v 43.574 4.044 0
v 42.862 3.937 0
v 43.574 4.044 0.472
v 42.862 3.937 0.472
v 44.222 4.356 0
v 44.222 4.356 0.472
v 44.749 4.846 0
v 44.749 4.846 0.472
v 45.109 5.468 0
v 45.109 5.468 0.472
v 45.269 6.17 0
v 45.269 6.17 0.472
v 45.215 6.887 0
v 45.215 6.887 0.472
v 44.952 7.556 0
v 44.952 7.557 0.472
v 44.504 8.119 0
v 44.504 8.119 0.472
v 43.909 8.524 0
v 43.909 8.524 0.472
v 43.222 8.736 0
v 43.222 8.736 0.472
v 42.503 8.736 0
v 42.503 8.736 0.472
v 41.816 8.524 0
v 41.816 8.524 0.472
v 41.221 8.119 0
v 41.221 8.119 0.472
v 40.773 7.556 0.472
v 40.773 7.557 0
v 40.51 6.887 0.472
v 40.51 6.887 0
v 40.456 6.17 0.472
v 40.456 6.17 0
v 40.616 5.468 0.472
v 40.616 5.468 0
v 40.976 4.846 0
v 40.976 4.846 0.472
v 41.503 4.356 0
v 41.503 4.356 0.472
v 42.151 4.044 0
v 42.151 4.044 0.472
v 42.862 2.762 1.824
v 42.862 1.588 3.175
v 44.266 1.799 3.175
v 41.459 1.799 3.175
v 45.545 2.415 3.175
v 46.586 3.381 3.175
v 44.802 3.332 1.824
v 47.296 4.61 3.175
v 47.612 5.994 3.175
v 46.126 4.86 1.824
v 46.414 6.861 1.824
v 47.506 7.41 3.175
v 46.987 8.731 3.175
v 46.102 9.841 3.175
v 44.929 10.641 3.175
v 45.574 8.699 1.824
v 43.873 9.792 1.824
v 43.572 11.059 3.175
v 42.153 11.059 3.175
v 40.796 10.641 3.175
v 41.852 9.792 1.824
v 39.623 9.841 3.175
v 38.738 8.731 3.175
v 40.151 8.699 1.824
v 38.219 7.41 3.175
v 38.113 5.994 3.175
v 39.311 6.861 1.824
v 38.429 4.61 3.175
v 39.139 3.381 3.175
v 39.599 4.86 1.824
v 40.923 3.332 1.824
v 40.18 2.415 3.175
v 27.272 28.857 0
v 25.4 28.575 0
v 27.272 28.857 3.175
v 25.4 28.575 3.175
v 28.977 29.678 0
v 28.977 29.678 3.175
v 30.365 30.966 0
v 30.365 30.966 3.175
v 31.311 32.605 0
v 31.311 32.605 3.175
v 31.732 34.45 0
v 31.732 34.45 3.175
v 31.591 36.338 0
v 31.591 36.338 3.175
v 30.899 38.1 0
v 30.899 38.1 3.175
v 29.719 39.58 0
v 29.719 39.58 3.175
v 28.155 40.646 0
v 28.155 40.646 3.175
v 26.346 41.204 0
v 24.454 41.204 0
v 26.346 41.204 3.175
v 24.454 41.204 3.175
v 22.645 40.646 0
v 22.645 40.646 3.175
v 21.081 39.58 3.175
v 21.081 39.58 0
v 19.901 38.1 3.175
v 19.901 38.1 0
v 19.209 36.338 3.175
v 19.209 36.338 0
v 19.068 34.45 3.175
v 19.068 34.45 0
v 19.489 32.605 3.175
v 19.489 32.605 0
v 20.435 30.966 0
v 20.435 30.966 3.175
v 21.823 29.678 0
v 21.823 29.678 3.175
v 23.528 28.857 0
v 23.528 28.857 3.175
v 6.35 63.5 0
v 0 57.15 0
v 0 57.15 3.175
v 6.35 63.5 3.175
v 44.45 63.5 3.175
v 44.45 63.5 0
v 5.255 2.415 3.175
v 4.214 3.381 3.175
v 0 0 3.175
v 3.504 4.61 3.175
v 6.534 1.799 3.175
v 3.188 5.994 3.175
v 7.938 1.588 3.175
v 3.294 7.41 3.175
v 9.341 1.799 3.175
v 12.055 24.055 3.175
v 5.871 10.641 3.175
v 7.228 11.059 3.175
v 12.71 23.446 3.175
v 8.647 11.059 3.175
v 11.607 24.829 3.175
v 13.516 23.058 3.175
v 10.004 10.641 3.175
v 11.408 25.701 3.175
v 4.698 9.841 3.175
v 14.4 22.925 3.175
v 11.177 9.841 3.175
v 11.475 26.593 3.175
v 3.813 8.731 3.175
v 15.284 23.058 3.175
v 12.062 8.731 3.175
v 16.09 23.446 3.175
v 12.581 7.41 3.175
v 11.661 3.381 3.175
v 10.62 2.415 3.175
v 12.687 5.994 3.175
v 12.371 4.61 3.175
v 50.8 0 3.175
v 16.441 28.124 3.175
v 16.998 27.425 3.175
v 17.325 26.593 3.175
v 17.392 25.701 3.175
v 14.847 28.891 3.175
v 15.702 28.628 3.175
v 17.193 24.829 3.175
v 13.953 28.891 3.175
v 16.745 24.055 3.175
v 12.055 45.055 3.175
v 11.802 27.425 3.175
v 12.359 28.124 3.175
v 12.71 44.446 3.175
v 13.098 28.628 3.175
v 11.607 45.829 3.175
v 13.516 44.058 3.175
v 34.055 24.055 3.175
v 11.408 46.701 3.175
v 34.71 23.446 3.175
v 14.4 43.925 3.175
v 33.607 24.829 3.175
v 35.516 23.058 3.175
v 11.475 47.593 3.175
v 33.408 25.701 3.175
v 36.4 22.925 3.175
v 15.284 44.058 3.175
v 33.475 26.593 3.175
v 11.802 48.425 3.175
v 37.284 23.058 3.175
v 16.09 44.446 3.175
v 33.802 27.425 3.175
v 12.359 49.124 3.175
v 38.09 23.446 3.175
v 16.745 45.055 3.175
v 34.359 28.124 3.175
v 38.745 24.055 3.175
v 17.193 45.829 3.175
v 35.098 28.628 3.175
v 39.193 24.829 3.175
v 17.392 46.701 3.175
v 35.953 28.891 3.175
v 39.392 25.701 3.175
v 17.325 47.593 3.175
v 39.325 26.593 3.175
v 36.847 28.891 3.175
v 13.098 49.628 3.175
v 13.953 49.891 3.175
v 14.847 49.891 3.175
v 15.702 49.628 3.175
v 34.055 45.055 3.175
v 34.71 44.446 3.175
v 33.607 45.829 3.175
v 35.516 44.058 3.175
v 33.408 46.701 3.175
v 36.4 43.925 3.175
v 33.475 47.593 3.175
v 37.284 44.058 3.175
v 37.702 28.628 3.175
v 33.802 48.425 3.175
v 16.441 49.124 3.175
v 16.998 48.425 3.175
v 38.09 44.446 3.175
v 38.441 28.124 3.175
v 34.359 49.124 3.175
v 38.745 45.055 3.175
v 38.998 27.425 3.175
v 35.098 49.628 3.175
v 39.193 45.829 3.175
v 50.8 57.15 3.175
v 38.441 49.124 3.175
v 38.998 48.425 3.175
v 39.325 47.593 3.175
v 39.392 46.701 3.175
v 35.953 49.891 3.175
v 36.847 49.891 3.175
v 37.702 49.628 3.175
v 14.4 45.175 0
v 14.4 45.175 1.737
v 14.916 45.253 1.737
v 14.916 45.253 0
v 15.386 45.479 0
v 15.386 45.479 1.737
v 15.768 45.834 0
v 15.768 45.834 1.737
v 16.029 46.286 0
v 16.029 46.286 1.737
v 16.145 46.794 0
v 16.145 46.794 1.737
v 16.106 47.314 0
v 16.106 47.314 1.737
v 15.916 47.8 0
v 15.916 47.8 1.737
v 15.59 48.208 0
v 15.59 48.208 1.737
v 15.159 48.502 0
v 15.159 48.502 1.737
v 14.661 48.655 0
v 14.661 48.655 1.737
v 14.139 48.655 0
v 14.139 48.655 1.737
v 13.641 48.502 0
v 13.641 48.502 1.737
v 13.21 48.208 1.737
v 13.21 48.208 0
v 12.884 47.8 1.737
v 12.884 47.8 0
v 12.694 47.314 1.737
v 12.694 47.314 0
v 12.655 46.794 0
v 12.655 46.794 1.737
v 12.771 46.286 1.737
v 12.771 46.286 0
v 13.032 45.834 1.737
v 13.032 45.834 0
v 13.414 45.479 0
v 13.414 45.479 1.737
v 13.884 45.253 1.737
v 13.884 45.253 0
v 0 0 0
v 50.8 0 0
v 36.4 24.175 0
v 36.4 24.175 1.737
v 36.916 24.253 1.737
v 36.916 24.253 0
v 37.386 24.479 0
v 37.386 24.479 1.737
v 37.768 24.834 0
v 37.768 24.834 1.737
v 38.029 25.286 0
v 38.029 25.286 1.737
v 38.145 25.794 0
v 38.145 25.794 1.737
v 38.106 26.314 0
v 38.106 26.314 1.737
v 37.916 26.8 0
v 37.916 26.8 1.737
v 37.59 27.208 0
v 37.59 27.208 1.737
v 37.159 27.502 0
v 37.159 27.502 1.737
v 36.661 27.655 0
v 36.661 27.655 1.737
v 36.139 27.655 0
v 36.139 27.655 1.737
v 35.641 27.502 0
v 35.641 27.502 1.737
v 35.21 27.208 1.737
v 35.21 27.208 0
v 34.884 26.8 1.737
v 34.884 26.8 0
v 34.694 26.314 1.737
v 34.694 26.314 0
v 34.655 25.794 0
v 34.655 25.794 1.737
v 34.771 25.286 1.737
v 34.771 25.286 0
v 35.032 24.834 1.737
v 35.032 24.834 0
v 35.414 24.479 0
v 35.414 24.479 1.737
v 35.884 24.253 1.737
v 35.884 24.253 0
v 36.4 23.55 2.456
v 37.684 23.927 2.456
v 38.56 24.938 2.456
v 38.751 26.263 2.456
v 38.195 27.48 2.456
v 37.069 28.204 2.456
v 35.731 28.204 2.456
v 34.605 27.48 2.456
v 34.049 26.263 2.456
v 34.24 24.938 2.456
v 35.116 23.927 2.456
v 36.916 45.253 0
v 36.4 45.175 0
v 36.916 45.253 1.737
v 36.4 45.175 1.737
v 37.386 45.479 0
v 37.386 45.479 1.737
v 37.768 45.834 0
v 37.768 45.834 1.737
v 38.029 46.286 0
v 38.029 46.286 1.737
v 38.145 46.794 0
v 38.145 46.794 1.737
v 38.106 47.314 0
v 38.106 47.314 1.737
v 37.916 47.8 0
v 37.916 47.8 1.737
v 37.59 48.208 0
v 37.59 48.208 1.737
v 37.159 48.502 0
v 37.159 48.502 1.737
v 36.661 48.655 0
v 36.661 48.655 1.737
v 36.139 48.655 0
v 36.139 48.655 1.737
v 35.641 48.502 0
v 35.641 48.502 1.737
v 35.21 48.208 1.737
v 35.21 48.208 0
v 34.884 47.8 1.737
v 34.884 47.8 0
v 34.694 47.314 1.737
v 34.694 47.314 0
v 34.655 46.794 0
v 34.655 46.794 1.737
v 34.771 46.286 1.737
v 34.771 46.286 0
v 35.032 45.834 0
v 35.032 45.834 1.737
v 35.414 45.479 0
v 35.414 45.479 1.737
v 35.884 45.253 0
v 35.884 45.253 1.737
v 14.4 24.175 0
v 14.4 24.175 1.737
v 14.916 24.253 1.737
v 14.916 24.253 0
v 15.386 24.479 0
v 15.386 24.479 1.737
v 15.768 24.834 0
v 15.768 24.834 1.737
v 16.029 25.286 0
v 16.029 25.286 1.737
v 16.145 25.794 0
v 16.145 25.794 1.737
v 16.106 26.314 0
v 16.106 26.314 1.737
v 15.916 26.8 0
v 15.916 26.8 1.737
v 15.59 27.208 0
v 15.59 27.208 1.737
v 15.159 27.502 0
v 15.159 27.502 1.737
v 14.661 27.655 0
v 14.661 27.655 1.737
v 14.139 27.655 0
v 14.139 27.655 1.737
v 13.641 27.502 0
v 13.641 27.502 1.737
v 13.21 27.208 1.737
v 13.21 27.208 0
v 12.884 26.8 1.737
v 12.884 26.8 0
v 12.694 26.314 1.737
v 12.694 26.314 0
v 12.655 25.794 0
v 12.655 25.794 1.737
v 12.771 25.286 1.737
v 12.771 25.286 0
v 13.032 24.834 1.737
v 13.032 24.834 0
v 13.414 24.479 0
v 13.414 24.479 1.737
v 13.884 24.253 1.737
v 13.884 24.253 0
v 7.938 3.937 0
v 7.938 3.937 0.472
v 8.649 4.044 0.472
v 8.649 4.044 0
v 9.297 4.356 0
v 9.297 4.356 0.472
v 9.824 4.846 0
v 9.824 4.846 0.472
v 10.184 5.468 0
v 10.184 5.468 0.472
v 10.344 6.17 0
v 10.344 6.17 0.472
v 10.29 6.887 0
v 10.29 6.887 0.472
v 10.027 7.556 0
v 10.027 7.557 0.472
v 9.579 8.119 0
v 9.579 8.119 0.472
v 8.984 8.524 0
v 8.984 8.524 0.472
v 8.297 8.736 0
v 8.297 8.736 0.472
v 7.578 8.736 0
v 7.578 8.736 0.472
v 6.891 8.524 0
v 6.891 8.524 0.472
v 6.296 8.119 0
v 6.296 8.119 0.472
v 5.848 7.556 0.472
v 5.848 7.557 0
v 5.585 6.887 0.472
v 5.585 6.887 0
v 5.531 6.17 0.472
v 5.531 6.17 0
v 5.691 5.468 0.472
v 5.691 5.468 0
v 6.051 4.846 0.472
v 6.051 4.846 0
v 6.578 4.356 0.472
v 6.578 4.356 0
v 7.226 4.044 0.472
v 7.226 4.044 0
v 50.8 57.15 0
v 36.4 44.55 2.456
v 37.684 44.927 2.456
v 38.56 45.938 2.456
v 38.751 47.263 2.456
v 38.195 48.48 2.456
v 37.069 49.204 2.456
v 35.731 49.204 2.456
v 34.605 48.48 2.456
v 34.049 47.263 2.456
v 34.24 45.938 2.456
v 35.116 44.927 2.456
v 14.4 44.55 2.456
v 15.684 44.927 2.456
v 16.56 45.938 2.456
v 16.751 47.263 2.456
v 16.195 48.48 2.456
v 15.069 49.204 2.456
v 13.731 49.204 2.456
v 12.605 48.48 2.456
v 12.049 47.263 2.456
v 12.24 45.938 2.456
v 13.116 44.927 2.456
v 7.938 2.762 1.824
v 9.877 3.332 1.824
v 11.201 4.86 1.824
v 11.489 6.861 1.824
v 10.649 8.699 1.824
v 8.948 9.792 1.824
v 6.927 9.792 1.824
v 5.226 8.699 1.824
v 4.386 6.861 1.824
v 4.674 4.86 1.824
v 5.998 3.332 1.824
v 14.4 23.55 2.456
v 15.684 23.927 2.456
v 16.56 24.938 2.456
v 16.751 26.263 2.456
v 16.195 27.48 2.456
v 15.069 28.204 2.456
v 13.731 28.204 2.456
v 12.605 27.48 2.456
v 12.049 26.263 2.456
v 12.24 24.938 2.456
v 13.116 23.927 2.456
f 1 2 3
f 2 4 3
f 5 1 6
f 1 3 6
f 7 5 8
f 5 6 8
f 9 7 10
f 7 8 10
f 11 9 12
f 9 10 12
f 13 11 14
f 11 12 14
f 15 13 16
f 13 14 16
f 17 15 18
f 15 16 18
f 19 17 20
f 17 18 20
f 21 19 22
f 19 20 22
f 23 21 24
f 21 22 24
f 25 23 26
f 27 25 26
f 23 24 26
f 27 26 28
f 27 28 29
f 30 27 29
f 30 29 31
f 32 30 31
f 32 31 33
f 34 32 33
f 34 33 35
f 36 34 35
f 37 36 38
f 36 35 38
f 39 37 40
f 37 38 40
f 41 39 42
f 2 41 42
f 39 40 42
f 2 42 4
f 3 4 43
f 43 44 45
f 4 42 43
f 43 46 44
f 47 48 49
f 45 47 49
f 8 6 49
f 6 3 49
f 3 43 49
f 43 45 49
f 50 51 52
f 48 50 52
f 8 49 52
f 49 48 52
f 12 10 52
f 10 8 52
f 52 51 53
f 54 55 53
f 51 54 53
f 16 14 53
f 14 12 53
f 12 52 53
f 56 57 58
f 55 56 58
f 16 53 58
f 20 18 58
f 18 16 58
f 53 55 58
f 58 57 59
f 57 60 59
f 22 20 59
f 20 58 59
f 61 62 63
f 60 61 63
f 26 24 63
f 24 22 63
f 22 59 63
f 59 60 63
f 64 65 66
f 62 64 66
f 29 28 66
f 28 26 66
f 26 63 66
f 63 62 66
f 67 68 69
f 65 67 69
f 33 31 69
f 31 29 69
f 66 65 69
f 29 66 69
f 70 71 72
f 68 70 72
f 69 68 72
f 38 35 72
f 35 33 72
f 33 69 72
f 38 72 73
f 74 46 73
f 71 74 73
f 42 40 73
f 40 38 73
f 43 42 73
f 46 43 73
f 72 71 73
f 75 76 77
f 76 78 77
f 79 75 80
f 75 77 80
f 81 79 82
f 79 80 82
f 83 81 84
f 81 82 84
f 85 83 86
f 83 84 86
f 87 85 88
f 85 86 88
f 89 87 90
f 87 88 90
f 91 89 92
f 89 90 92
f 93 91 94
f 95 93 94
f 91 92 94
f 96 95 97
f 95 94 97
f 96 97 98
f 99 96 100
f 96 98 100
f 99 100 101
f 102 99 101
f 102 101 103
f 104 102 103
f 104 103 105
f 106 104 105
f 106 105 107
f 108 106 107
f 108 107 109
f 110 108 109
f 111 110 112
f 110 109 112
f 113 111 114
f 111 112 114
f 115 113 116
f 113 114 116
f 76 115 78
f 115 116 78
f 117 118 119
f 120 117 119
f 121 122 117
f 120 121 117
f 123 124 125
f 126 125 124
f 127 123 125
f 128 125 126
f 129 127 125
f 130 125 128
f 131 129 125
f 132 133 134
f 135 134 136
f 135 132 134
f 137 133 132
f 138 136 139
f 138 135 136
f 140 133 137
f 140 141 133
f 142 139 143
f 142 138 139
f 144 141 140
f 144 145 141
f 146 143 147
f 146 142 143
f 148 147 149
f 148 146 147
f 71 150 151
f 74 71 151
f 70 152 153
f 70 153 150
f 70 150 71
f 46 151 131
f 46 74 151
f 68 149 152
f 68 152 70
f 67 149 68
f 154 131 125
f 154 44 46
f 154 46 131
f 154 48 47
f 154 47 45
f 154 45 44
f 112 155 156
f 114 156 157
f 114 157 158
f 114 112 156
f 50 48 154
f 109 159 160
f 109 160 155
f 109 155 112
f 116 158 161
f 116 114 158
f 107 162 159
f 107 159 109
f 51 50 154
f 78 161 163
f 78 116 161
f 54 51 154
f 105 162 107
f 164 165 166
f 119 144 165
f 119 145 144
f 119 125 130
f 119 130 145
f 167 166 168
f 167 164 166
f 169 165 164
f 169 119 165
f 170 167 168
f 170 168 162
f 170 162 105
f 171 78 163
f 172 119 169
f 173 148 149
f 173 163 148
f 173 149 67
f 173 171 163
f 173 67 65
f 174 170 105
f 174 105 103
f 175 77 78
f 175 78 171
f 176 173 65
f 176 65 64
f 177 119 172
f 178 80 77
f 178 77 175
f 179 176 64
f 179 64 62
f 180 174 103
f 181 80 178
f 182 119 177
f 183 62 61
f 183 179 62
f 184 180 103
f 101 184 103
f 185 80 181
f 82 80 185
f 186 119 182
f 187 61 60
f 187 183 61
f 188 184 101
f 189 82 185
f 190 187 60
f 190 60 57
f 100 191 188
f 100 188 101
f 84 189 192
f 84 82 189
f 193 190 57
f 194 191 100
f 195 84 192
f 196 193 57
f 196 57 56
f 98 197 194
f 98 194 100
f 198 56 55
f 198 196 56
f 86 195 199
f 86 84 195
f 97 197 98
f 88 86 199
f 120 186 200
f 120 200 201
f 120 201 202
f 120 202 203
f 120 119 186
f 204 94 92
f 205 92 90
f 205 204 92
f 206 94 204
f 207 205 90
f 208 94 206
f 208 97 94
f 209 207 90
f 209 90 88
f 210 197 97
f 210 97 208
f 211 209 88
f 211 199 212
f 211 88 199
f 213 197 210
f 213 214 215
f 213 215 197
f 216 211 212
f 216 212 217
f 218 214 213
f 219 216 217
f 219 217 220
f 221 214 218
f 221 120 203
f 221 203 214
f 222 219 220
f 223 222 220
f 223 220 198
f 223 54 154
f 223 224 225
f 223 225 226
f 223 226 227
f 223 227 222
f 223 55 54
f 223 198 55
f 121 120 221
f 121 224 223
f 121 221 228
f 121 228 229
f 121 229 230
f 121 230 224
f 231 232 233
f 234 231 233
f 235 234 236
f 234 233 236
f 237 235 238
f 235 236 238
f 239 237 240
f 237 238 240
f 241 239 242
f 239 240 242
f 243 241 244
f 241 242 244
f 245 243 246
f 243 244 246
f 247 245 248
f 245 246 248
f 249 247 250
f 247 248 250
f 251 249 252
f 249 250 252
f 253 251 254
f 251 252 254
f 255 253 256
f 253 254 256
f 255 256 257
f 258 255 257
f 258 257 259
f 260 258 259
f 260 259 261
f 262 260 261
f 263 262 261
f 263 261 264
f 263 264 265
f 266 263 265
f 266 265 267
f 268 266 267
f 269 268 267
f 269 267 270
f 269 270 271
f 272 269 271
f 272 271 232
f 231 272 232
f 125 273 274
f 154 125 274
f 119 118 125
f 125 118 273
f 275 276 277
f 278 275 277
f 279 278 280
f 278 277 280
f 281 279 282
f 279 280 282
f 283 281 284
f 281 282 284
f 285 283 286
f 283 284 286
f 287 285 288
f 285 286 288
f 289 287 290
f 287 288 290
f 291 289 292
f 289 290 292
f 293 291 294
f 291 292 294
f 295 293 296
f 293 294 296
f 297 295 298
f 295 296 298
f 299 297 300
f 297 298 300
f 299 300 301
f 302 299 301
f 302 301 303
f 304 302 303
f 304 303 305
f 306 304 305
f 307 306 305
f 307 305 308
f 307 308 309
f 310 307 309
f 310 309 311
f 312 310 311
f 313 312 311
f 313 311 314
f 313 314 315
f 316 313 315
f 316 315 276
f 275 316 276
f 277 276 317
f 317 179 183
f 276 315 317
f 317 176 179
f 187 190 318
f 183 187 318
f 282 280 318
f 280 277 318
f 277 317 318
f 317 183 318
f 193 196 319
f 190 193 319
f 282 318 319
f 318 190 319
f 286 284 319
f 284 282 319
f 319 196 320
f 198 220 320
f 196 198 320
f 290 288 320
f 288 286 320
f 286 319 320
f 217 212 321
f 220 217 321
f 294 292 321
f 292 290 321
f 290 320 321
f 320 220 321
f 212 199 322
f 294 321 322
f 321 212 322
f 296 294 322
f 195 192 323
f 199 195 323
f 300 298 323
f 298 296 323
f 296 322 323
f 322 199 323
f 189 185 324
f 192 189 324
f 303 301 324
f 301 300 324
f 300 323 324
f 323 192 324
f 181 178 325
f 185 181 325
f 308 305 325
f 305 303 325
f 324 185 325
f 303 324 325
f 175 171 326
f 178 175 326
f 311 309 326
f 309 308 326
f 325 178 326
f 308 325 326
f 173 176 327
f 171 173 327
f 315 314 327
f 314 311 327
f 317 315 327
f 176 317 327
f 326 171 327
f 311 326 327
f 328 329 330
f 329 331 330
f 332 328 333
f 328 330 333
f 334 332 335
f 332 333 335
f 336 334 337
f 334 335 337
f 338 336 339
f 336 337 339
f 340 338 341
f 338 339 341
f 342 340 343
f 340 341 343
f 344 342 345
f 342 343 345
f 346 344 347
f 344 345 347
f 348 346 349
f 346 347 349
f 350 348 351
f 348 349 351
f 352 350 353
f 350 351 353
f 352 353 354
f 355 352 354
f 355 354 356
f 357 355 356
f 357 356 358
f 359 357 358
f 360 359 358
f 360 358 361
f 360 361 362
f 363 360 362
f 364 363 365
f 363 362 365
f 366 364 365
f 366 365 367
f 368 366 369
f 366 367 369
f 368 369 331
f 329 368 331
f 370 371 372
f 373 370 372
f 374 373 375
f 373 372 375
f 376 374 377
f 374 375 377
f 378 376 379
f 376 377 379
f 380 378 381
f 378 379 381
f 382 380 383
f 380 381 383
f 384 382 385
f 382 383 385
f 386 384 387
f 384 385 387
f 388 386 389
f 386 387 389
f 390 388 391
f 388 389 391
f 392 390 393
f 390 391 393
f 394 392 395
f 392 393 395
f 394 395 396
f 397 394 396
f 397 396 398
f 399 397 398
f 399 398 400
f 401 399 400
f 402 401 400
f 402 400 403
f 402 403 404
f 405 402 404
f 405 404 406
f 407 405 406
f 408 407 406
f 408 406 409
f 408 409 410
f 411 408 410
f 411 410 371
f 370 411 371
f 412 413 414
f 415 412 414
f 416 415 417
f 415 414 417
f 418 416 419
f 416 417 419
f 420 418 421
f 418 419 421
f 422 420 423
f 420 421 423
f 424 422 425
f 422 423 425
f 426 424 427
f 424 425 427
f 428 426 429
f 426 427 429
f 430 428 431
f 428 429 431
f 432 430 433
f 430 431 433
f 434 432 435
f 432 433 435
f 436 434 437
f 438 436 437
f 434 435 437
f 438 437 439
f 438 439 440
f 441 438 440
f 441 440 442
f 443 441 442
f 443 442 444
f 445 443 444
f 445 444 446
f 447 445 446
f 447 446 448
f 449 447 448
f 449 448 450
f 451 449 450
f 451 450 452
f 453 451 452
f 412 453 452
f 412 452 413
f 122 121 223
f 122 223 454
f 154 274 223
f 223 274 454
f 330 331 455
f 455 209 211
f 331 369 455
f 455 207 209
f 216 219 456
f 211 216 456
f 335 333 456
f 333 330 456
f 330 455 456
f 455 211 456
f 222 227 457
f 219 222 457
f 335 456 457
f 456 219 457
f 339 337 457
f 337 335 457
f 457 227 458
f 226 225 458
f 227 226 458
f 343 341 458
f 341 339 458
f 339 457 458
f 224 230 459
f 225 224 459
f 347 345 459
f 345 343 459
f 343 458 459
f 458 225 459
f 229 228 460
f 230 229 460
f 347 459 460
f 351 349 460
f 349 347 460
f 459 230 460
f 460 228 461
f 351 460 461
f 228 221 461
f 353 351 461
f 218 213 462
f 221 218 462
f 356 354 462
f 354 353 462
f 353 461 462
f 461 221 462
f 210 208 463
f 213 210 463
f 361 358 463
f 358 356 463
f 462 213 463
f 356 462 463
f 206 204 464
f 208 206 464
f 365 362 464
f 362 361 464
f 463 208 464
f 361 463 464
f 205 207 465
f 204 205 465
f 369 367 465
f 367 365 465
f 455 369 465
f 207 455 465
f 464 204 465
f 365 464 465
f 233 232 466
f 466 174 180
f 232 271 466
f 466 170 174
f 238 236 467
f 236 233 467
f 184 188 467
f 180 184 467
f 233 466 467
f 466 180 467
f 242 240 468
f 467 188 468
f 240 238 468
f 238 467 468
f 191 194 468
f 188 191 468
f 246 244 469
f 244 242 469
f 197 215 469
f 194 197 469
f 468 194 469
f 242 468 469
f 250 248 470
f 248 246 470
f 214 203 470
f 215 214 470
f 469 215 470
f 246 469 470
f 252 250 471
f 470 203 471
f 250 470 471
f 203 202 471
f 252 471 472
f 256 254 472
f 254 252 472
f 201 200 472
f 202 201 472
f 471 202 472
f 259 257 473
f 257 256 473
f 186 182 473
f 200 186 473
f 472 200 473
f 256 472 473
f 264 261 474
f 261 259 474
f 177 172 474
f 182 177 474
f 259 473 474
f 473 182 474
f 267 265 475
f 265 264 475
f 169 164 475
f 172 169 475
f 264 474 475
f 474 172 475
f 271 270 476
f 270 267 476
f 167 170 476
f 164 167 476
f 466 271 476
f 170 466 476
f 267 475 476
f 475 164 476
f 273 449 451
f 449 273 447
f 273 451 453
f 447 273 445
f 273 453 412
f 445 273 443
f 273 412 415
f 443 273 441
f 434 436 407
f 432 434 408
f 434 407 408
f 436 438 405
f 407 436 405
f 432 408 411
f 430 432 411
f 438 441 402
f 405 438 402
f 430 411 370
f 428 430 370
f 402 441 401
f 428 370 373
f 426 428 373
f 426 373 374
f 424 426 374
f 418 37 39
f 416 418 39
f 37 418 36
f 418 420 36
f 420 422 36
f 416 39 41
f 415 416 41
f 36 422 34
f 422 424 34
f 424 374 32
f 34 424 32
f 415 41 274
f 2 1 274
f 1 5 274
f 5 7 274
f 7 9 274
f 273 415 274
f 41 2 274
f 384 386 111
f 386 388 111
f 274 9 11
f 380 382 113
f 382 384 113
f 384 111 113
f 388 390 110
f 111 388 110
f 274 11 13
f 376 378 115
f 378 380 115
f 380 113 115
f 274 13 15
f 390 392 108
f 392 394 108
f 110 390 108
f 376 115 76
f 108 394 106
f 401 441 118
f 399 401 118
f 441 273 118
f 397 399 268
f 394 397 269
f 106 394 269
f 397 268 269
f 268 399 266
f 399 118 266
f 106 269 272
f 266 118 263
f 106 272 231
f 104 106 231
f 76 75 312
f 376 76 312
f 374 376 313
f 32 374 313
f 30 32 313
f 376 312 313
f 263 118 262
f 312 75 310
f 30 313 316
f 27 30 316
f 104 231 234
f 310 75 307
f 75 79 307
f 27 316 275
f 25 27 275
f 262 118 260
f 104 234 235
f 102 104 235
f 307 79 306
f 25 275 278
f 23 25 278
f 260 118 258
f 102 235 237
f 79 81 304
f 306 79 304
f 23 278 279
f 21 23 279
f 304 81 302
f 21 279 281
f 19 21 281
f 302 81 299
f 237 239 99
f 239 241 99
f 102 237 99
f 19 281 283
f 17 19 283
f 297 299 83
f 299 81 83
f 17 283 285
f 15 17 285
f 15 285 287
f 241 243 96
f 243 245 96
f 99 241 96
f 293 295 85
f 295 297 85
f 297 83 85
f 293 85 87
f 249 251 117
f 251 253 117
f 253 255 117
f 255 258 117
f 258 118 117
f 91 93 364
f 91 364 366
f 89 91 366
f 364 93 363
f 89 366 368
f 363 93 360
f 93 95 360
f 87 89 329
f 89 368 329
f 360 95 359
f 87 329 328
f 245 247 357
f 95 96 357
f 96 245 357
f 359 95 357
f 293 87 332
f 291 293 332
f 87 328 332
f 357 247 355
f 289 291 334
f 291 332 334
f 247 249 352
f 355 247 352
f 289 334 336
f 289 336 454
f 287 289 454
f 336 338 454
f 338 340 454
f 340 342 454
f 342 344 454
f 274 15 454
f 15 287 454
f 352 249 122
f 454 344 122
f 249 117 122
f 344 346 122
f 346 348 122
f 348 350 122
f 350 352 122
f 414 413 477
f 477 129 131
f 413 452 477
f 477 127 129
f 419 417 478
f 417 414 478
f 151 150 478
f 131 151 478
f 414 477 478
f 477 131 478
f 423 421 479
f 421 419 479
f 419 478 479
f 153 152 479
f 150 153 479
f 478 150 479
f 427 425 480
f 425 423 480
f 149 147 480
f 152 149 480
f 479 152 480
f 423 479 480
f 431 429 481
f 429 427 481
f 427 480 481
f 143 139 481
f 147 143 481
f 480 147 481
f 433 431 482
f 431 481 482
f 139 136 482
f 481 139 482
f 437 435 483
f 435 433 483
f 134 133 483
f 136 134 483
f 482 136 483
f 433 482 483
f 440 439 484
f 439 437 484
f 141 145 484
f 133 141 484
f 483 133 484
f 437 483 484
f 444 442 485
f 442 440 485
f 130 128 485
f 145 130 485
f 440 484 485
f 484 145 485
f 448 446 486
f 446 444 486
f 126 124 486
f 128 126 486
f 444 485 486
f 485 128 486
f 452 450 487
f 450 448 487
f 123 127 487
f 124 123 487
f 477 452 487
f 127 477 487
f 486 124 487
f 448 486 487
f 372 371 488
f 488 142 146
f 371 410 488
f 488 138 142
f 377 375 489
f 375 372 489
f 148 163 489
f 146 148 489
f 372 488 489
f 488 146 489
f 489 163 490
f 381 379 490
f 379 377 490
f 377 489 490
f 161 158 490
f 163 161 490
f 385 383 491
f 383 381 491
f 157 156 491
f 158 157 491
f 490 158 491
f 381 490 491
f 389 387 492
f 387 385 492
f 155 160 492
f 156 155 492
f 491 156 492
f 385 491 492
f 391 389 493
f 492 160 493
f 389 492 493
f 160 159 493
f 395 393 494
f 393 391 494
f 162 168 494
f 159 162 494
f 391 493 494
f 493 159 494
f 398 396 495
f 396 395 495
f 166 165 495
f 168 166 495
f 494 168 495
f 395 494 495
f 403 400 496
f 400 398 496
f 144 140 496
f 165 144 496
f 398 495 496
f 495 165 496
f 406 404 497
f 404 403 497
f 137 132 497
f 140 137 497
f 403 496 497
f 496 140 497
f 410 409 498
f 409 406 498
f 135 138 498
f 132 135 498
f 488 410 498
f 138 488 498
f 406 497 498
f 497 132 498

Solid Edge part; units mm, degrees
sketch "Sketch1" plane through (0, 0, 0) normal (0, 0, 1) x (1, 0, 0)
  line L0 (0, 0) -> (50.8, 0)
  line L1 (50.8, 0) -> (50.8, 63.5)
  line L2 (50.8, 63.5) -> (0, 63.5)
  line L3 (0, 63.5) -> (0, 0)
  dimension "D1" = 50.8
  dimension "D2" = 63.5
extrude "Protrusion1" add sketch "Sketch1" along normal blind 3.175
hole "Hole_1" at (42.8625, 6.35, 3.175) direction (0, 0, -1) diameter 4.826 end up to next countersink diameter 9.525 countersink angle 82
hole "Hole1" at (7.9375, 6.35, 3.175) direction (0, 0, -1) diameter 4.826 end up to next countersink diameter 9.525 countersink angle 82
hole "Hole_2" at (25.4, 34.925, 3.175) direction (0, 0, -1) diameter 12.7 end up to next
chamfer "Chamfer_1" distance 6.35 angle 45 2 edges at (0, 63.5, 1.5875) (50.8, 63.5, 1.5875)
hole "Hole_4" at (36.4, 46.925, 3.175) direction (0, 0, -1) diameter 3.5 end up to next countersink diameter 6 countersink angle 82
hole "Hole2" at (36.4, 25.925, 3.175) direction (0, 0, -1) diameter 3.5 end up to next countersink diameter 6 countersink angle 82
hole "Hole3" at (14.4, 25.925, 3.175) direction (0, 0, -1) diameter 3.5 end up to next countersink diameter 6 countersink angle 82
hole "Hole4" at (14.4, 46.925, 3.175) direction (0, 0, -1) diameter 3.5 end up to next countersink diameter 6 countersink angle 82
properties part number "CHAS-04" material "Aluminum, 1060"
